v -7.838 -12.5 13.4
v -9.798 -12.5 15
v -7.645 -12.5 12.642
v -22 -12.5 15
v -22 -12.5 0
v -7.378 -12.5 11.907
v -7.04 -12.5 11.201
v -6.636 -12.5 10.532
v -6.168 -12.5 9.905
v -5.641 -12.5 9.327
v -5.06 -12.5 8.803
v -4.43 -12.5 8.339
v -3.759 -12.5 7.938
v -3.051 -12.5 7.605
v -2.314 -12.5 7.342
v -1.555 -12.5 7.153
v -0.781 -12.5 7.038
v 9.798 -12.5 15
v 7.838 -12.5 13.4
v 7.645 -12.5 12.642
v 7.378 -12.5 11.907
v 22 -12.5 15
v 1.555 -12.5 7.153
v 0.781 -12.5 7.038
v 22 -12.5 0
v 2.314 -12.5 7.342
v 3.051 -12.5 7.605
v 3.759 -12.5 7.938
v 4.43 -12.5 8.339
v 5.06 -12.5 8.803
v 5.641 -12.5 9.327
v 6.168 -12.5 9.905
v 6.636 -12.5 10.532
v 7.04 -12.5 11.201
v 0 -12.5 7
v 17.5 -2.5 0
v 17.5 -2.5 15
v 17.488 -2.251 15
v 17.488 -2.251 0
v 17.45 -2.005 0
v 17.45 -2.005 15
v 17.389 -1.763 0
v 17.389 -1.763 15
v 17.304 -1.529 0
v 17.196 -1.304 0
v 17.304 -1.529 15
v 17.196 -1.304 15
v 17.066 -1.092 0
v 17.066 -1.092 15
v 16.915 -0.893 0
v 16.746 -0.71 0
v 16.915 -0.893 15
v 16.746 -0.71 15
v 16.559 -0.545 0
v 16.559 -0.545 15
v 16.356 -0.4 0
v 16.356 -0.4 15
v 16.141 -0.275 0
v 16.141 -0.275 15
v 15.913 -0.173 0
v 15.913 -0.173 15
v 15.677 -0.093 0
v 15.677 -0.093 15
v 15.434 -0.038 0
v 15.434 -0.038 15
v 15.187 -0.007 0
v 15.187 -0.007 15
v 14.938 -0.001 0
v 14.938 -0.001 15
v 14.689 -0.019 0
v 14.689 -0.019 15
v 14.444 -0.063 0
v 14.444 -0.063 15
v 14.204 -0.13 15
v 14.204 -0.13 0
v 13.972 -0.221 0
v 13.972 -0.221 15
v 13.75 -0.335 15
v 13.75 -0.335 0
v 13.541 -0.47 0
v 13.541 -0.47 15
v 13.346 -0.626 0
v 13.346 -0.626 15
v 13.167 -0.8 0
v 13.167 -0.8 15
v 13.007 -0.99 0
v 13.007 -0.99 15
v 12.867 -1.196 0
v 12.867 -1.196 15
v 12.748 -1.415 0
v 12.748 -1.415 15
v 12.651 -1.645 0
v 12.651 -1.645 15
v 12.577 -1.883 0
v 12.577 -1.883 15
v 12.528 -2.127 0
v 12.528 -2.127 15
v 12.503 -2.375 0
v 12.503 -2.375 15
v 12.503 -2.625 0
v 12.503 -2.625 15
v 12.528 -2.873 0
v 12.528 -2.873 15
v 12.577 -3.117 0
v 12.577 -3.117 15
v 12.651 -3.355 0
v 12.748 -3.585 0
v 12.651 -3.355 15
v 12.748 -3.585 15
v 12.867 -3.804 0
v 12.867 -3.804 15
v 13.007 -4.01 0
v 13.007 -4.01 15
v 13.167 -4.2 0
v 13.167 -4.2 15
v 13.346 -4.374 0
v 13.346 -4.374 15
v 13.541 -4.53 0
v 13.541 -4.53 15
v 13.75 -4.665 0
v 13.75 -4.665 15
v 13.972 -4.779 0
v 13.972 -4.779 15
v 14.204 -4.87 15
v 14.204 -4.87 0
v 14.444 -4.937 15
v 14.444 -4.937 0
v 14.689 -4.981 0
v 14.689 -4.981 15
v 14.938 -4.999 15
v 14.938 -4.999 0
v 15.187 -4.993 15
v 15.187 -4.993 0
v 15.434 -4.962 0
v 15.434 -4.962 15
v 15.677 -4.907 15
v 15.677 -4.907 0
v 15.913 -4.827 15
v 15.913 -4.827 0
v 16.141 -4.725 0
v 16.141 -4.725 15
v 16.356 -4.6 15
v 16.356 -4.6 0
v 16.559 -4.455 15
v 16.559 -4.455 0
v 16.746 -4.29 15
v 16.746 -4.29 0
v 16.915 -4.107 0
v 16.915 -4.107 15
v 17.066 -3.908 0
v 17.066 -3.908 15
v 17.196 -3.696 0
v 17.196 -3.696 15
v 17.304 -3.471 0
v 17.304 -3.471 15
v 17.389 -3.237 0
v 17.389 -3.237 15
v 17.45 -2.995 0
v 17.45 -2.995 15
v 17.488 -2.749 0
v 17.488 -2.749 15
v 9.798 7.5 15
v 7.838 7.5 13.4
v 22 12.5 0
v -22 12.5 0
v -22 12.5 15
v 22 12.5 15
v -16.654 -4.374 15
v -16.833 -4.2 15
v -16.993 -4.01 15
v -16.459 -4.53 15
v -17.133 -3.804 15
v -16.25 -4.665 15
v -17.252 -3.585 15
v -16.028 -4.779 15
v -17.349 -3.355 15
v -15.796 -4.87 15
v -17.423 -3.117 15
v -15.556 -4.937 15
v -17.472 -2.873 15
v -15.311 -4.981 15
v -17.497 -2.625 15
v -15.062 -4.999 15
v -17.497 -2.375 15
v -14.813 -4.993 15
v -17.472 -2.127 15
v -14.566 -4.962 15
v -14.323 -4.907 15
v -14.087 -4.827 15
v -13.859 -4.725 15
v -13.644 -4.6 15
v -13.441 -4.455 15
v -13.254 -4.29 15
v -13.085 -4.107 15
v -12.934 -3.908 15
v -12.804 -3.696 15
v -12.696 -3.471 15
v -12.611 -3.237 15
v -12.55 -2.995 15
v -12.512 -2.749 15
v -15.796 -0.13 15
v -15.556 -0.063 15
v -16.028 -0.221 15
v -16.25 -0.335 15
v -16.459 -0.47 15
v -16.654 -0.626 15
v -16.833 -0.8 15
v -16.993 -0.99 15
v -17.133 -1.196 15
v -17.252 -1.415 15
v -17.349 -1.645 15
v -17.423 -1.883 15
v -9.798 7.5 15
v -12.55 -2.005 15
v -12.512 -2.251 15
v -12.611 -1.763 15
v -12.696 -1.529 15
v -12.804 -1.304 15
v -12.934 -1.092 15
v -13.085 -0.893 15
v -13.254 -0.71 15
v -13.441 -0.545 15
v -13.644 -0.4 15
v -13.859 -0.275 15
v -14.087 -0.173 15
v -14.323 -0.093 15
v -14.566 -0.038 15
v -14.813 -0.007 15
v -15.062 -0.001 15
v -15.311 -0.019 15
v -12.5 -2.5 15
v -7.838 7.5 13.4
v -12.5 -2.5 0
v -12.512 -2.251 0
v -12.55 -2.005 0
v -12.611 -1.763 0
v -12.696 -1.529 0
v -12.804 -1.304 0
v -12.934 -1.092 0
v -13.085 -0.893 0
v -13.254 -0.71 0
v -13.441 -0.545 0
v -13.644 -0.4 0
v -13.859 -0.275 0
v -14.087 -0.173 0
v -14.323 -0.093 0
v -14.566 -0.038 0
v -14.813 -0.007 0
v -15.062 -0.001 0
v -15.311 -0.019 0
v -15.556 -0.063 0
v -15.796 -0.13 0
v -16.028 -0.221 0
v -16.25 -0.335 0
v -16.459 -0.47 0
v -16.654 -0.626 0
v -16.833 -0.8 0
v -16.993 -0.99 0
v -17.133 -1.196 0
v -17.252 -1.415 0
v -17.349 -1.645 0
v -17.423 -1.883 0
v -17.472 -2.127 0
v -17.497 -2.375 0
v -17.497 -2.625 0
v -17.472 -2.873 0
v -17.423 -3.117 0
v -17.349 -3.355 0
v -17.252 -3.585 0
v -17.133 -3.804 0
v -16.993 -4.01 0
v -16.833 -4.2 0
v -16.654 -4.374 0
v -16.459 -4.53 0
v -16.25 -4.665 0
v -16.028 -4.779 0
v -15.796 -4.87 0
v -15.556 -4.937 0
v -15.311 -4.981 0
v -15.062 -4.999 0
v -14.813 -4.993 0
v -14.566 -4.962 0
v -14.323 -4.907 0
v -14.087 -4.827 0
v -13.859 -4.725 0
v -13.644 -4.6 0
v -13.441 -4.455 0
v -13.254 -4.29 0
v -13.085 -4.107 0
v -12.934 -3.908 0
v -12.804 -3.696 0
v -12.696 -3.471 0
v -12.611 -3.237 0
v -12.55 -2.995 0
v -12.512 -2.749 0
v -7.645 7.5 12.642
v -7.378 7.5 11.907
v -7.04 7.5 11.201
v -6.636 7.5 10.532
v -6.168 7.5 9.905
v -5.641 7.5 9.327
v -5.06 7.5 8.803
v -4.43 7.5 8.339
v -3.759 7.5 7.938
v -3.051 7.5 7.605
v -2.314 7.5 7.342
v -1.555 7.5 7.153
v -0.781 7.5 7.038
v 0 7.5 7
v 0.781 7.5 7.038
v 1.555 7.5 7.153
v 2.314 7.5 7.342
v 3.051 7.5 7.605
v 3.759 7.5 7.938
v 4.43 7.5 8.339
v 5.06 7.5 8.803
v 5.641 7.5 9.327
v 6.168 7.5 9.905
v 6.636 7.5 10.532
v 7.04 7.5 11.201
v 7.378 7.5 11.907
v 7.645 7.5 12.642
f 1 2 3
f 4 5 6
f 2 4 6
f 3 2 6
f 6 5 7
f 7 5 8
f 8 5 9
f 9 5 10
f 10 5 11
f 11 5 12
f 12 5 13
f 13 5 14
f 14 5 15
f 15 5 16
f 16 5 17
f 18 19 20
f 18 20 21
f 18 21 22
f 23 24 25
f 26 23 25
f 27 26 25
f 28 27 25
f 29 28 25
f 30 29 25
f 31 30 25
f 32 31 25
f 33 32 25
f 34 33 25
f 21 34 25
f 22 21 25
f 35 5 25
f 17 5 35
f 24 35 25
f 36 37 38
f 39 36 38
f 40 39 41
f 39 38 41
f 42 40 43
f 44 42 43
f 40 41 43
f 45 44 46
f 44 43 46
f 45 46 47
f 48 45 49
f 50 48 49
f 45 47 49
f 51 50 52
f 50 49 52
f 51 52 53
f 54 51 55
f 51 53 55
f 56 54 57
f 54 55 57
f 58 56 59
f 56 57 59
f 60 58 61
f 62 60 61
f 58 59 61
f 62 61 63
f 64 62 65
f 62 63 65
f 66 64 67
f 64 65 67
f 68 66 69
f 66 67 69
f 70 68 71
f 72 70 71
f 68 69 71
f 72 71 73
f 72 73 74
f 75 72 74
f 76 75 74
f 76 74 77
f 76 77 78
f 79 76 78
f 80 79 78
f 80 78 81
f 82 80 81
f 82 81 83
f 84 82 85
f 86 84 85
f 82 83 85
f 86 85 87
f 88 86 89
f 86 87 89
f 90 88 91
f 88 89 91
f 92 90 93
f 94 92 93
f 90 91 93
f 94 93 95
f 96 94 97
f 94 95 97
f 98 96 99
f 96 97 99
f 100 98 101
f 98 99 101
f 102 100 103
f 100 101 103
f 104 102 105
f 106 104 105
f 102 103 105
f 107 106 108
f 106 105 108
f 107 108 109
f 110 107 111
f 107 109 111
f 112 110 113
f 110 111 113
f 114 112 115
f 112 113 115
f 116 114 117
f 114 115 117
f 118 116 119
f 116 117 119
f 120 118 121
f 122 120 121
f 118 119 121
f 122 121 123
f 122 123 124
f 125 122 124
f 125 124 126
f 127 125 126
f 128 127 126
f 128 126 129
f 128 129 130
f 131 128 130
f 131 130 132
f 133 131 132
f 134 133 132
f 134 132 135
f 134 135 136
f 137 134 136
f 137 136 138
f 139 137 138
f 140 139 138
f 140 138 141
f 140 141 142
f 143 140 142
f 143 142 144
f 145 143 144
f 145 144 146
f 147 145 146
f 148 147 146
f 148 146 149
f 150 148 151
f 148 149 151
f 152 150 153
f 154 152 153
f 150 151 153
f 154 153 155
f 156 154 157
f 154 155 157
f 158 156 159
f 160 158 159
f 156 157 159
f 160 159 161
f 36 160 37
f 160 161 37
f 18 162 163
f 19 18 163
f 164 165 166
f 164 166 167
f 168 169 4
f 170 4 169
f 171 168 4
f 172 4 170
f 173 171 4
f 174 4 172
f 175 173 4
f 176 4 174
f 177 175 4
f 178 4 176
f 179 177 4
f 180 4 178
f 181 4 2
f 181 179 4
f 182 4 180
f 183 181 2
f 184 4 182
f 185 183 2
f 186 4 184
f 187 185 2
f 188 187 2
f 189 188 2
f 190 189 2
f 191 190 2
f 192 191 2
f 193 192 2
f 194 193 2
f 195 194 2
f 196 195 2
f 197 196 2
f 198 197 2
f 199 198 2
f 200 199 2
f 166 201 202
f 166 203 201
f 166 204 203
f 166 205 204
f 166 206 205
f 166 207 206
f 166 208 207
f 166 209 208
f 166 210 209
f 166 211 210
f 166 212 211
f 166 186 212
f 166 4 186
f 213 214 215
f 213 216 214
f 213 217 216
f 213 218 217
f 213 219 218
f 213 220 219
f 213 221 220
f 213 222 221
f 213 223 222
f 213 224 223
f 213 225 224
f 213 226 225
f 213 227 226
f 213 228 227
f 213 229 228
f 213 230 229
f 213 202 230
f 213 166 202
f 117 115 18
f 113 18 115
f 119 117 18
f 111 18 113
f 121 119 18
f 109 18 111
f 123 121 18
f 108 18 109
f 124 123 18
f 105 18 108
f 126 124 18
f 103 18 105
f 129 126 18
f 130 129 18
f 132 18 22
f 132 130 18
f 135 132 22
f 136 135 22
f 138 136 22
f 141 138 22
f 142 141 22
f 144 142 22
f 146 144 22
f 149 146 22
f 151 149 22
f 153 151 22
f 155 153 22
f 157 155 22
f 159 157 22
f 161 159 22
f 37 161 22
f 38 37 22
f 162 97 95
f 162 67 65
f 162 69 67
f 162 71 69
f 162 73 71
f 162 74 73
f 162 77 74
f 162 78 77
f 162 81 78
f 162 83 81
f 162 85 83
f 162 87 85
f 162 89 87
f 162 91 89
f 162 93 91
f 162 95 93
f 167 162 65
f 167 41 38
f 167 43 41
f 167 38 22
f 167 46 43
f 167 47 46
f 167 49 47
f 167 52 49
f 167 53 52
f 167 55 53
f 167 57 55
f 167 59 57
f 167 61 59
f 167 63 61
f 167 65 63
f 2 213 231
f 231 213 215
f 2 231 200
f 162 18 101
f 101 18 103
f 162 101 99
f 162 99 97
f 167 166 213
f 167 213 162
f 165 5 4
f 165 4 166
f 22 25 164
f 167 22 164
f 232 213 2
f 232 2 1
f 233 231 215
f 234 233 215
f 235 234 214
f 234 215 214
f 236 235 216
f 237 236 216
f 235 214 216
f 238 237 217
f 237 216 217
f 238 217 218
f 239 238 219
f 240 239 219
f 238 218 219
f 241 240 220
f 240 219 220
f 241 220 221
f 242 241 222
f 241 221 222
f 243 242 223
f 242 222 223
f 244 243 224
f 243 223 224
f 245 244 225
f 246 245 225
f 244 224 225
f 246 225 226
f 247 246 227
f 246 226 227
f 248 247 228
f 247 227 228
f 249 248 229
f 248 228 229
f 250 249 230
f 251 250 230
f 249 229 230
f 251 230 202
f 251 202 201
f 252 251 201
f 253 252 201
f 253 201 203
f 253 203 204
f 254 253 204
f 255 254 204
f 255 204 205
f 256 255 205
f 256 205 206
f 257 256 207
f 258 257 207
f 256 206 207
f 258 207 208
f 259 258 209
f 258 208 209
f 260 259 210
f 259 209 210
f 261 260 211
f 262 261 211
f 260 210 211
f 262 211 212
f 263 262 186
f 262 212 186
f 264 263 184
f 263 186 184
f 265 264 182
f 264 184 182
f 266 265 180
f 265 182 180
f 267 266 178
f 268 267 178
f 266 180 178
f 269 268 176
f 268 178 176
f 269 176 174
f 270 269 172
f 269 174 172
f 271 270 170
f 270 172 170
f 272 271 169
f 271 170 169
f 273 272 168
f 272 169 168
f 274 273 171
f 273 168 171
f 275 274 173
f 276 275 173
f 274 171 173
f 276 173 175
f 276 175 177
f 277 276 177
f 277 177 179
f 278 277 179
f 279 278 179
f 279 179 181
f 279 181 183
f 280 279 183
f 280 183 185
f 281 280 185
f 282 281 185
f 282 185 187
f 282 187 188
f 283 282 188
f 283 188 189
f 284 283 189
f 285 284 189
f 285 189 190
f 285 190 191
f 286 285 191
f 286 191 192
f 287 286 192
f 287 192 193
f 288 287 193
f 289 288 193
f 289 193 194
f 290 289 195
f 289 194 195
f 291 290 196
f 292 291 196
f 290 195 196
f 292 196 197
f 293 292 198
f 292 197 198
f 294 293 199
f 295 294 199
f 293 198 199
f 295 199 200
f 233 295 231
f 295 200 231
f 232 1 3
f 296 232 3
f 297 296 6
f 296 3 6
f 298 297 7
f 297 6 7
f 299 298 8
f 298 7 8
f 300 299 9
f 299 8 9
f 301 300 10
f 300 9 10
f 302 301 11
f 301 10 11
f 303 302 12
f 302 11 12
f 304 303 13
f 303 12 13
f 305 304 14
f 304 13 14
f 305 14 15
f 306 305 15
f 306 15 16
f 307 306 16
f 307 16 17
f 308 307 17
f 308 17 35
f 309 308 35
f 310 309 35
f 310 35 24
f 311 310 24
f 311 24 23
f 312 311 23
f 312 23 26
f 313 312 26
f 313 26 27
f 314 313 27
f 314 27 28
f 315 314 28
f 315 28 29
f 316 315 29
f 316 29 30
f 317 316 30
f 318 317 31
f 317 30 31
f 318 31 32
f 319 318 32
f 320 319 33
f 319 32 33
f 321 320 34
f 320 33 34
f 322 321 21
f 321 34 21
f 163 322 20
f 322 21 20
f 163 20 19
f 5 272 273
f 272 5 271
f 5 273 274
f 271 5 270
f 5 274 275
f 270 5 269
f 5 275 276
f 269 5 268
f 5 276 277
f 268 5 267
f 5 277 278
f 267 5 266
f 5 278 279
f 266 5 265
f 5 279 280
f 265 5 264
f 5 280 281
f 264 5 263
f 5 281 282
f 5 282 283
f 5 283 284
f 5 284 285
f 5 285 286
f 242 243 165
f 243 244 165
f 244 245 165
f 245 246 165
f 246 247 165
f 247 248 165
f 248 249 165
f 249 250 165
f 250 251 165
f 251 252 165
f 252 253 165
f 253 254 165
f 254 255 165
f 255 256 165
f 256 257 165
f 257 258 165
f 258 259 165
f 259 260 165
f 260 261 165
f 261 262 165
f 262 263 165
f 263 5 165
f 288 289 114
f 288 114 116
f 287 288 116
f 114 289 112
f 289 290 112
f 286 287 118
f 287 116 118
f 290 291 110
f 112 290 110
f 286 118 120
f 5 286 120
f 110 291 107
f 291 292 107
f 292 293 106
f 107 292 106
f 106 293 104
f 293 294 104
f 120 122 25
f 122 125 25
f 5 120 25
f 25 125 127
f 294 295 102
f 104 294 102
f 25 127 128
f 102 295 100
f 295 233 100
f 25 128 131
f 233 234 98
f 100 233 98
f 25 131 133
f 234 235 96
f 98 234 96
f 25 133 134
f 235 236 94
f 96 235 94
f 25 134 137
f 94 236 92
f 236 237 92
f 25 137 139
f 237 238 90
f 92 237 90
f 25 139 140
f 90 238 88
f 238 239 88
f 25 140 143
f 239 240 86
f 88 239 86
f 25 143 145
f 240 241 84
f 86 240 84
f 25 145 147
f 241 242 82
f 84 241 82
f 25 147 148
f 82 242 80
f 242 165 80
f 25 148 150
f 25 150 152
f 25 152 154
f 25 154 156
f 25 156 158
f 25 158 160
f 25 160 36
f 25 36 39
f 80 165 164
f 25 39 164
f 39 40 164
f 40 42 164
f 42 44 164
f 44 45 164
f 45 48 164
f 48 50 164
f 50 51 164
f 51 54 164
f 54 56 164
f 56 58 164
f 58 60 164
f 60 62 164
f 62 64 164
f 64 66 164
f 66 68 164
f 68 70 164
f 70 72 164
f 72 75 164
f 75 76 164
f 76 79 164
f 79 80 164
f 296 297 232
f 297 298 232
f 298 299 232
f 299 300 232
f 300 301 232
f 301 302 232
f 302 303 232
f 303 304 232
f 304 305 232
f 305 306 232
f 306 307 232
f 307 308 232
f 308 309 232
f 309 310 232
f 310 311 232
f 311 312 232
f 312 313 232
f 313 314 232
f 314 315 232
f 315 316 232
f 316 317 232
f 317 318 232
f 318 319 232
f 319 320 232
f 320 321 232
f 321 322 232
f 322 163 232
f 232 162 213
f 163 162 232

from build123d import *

# Parameters (mm, degrees)
F0_W        = 44
F0_H        = 25
F1_DEPTH    = 15
F2_R        = 8
F3_DEPTH    = 20
F4_R        = 2.5
F5_DEPTH    = 15
F6_T1_DEPTH = 24.6515369414


# Not quite as in the source:
# - a fillet or chamfer that OpenCascade refuses, or shapes differently, is made with other operations: its cross-section is extruded or revolved along the edge and cut away or added


with BuildPart() as f1:
    # F0 (on Top) → F1 (new body)
    with BuildSketch(Plane.XY):
        Rectangle(F0_W, F0_H)
    extrude(amount=F1_DEPTH)

    # F2 (on face) → F3 (cut)
    with BuildSketch(Plane.XZ.offset(12.5)):
        with Locations((0, 15)):
            Circle(F2_R)
    extrude(amount=-F3_DEPTH, mode=Mode.SUBTRACT)

    # F4 (on face) → F5 (cut)
    with BuildSketch(Plane.XY.offset(15)):
        with Locations((-15, -2.5)):
            Circle(F4_R)
        with Locations((15, -2.5)):
            Circle(F4_R)
    extrude(amount=-F5_DEPTH, mode=Mode.SUBTRACT)

    # F6: chamfer of 2 on 2 edges, made by hand

    # F6_s2 → F6_t1 (cut)
    with BuildSketch(Plane.XZ.offset(-7.5)):
        with BuildLine():
            Line((9.7979589711, 15), (7.8383671769, 13.4))
            ThreePointArc((7.8383671769, 13.4), (7.9565711479, 14.1675484588), (8, 15))
            Line((8, 15), (9.7979589711, 15))
        make_face()
        with BuildLine():
            Line((-9.7979589711, 15), (-7.8383671769, 13.4))
            ThreePointArc((-7.8383671769, 13.4), (-7.9565711479, 14.1675484588), (-8, 15))
            Line((-8, 15), (-9.7979589711, 15))
        make_face()
    extrude(amount=F6_T1_DEPTH, mode=Mode.SUBTRACT)


solid = f1.part
